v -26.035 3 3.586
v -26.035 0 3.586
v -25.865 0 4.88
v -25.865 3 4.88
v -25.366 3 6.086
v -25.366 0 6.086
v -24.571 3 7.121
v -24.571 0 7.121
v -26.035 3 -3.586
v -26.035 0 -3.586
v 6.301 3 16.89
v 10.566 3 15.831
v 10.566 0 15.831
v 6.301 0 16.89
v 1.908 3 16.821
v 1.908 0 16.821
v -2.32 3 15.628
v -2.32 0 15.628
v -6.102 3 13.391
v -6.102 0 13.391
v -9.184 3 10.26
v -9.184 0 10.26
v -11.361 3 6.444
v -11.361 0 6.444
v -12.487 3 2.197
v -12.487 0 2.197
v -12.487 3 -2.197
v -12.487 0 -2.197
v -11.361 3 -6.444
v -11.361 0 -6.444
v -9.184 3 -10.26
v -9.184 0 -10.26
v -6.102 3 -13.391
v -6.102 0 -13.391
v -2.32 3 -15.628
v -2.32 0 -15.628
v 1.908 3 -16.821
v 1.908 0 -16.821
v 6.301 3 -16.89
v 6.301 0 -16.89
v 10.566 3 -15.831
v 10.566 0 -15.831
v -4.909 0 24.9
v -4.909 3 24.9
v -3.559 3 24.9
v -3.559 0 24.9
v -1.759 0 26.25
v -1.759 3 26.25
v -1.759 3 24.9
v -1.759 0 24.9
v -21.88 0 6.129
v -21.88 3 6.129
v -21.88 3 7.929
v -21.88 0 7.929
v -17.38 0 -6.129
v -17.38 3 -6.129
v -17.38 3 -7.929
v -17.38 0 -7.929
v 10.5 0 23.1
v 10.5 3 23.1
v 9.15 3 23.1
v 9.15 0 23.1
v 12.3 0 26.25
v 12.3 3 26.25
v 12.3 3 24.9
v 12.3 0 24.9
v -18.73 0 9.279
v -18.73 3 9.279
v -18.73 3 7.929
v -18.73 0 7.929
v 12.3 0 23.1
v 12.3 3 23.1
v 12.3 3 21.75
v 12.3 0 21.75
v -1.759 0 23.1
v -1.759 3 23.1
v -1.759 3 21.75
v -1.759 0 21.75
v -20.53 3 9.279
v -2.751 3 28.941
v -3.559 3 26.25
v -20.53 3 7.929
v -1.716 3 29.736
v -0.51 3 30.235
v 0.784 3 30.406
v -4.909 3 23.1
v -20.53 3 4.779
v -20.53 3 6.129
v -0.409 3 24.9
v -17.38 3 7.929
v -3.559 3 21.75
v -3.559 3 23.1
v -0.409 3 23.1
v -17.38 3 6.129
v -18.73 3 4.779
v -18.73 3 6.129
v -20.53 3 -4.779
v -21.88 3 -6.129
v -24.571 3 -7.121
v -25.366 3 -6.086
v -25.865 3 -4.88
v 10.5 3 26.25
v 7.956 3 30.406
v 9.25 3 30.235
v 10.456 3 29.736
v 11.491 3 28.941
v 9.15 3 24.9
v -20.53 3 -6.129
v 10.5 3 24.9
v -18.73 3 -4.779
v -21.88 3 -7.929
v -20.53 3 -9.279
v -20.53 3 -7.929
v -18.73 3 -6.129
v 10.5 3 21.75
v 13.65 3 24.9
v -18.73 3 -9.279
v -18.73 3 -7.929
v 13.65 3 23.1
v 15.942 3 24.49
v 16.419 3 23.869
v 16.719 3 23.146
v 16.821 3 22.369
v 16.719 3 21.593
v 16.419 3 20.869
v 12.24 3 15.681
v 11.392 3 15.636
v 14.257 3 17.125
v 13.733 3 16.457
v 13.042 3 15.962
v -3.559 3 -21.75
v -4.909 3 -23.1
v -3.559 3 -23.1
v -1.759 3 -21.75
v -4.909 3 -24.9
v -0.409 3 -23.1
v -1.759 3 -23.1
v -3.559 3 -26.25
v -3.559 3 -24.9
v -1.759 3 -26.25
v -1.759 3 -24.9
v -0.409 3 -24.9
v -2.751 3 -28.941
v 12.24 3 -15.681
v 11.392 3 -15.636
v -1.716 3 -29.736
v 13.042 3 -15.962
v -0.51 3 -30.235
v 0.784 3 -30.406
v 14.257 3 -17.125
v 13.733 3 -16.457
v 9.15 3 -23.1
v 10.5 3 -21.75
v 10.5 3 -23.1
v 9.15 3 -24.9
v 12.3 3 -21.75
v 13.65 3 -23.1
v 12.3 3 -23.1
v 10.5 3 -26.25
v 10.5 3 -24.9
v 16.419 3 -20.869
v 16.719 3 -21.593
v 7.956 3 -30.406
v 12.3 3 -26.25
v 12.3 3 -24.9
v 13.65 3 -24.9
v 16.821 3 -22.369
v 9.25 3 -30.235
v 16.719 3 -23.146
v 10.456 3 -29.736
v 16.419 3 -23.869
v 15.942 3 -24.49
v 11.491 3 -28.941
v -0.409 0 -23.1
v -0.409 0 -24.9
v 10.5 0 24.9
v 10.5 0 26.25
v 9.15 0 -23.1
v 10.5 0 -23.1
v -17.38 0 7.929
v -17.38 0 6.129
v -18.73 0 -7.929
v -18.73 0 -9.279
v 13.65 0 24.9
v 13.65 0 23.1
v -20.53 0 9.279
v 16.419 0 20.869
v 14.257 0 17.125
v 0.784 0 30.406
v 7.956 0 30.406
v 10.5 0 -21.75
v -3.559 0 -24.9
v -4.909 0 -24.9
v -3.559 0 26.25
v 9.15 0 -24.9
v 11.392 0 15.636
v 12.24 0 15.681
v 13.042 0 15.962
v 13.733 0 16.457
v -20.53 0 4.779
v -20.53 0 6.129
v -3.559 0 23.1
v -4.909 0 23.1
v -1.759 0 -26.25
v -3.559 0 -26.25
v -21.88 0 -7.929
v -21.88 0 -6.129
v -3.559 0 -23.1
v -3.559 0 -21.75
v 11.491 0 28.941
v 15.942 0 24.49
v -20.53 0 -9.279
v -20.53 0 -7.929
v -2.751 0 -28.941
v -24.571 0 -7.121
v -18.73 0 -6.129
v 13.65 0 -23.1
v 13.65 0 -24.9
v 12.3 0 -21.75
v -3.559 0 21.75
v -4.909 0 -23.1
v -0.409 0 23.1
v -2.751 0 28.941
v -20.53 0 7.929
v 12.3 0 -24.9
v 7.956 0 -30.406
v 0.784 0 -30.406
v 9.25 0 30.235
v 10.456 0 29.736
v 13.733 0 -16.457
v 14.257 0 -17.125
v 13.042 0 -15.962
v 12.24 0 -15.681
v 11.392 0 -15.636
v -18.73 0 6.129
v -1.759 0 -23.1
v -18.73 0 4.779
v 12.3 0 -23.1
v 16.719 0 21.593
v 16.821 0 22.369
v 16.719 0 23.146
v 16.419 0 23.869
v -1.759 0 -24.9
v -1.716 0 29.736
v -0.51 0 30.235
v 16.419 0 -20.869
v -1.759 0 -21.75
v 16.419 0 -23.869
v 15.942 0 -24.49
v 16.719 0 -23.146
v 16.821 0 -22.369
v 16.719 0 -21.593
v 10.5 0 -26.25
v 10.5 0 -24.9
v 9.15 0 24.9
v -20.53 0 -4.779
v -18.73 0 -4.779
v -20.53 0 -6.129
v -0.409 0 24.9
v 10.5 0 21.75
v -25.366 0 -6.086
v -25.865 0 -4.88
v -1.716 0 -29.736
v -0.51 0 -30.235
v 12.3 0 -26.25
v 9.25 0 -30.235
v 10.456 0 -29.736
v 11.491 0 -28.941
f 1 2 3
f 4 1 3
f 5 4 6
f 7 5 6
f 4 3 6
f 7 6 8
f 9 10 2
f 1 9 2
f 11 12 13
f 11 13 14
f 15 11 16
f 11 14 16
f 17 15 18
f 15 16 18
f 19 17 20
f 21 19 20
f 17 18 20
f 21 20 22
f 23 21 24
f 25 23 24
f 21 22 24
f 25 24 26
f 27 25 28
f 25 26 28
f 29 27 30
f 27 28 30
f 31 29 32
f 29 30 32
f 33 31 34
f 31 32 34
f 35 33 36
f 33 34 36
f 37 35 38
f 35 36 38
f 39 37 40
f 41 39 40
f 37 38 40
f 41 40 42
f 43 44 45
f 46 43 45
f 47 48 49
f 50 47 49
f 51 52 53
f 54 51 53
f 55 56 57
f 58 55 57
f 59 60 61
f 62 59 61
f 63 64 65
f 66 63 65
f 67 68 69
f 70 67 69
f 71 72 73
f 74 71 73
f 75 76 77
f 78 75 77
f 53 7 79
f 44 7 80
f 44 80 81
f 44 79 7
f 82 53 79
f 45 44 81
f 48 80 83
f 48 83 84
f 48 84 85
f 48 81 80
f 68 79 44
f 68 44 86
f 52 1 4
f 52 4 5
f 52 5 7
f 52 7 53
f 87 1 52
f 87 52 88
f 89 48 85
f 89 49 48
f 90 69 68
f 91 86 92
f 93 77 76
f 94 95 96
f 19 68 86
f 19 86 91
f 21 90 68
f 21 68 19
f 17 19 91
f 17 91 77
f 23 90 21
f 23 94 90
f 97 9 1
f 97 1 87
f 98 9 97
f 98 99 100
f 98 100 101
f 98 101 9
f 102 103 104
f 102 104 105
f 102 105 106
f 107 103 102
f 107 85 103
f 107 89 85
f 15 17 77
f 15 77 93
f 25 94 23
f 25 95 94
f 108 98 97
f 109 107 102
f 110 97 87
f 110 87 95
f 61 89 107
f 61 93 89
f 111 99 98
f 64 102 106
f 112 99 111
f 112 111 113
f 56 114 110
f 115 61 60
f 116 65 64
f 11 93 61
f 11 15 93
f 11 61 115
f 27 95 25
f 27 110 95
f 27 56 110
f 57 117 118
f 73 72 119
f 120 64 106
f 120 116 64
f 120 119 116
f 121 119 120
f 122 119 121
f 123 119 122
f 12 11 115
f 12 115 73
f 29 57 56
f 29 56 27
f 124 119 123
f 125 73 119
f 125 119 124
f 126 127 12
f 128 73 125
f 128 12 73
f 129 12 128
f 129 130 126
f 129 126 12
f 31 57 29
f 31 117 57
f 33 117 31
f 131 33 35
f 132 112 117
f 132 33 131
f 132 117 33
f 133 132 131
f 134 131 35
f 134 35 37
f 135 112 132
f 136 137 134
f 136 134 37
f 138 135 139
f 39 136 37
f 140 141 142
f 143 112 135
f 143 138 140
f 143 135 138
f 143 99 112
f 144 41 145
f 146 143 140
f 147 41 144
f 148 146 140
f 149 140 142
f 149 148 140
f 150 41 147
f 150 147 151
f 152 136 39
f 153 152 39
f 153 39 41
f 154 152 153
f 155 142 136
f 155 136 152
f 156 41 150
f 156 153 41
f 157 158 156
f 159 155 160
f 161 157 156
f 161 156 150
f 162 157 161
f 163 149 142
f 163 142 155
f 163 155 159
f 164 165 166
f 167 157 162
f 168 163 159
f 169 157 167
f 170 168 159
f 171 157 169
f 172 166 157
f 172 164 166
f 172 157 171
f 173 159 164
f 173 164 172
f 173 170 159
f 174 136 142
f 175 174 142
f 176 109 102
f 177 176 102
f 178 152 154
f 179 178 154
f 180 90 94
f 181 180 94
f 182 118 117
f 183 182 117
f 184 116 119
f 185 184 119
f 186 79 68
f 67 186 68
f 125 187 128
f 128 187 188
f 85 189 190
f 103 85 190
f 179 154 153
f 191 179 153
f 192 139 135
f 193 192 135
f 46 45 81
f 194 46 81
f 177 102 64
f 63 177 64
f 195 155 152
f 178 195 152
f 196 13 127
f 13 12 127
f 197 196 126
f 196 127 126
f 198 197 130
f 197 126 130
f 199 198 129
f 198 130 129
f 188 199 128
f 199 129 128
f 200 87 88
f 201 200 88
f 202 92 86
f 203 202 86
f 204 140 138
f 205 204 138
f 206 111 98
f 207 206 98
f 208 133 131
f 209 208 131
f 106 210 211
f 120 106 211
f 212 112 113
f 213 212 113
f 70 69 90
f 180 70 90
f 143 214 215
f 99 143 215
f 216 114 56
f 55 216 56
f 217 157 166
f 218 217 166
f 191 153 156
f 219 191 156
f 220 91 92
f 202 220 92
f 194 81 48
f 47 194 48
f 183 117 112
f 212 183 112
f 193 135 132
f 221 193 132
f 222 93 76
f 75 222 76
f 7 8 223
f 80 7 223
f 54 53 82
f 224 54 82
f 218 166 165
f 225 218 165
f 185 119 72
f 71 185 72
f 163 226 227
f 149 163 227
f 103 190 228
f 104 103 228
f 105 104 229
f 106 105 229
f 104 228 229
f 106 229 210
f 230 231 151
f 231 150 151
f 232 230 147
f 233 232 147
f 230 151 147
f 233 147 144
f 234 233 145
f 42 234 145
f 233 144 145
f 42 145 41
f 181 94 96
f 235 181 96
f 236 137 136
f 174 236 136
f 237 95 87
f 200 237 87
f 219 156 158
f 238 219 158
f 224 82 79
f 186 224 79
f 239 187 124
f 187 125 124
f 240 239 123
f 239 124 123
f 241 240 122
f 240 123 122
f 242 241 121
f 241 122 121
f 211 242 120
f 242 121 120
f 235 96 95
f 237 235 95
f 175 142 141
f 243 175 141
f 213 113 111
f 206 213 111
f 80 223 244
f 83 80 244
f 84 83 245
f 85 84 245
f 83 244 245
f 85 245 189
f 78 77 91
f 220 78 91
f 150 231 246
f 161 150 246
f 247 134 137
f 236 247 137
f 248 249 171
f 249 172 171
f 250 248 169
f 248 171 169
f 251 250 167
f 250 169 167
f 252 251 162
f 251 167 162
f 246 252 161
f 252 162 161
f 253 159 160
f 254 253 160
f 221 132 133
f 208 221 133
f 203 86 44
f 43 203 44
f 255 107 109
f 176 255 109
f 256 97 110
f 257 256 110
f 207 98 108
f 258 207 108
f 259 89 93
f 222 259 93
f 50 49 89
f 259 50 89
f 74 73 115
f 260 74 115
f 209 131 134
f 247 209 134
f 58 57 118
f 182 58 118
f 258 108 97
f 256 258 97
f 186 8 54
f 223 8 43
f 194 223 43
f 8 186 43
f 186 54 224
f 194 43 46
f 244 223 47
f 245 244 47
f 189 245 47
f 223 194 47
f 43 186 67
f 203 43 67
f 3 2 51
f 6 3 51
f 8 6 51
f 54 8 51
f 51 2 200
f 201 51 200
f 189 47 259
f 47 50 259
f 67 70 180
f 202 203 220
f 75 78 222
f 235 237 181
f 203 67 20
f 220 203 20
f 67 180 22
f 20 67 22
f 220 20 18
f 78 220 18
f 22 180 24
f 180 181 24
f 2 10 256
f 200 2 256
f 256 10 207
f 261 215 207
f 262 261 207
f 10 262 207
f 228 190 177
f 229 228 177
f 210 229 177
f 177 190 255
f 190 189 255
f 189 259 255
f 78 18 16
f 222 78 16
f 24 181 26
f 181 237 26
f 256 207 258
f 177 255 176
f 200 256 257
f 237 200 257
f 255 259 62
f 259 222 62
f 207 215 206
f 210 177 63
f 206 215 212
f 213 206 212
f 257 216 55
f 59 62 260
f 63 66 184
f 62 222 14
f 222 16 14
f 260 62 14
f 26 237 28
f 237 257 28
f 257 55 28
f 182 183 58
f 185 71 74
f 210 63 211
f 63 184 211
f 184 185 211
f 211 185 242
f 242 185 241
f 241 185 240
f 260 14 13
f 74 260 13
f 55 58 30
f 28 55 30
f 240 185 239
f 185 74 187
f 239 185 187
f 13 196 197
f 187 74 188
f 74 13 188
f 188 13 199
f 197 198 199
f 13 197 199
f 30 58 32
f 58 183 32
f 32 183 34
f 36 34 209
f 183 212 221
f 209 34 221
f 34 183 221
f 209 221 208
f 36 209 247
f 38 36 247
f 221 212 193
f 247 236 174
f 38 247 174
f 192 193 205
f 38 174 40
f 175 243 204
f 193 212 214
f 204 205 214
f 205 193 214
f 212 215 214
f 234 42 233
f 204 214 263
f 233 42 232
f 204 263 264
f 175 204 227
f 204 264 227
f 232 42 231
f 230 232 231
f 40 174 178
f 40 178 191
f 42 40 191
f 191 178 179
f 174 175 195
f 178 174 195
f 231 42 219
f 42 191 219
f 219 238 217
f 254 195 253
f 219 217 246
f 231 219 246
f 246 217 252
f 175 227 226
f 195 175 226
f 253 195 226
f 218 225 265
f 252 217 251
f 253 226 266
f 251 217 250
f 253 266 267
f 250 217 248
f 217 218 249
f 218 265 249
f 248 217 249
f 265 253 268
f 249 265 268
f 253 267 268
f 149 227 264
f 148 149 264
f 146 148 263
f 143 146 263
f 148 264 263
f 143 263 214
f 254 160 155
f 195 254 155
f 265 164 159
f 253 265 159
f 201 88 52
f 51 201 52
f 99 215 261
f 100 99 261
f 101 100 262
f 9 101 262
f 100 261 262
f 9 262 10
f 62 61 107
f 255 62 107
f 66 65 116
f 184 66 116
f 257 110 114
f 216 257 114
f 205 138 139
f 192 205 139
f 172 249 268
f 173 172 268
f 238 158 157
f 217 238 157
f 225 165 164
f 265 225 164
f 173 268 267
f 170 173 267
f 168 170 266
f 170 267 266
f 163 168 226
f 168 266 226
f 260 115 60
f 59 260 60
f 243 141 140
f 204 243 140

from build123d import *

# Parameters (mm, degrees)
BOSS_EXTRUDE1_DEPTH = 3
CUT_EXTRUDE1_DEPTH  = 4
FILLET1_R           = 3


with BuildPart() as part:
    # Sketch1 → Boss-Extrude1 (new body)
    with BuildSketch(Plane(origin=(0, 0, 0), x_dir=(1, 0, 0), z_dir=(0, 1, 0))):
        with BuildLine():
            Line((17.56993863, 22.86267454), (11.491487674, 28.941125497))
            ThreePointArc((11.491487674, 28.941125497), (9.869370929, 30.024989254), (7.955953768, 30.405591591))
            Line((7.955953768, 30.405591591), (0.784380892, 30.405591591))
            ThreePointArc((0.784380892, 30.405591591), (-1.129036269, 30.024989254), (-2.751153014, 28.941125497))
            Line((-2.751153014, 28.941125497), (-24.570958167, 7.121320344))
            ThreePointArc((-24.570958167, 7.121320344), (-25.654821924, 5.499203599), (-26.035424261, 3.585786438))
            Line((-26.035424261, 3.585786438), (-26.035424261, -3.585786438))
            ThreePointArc((-26.035424261, -3.585786438), (-25.654821924, -5.499203599), (-24.570958167, -7.121320344))
            Line((-24.570958167, -7.121320344), (-2.751153014, -28.941125497))
            ThreePointArc((-2.751153014, -28.941125497), (-1.129036269, -30.024989254), (0.784380892, -30.405591591))
            Line((0.784380892, -30.405591591), (7.955953768, -30.405591591))
            ThreePointArc((7.955953768, -30.405591591), (9.869370929, -30.024989254), (11.491487674, -28.941125497))
            Line((11.491487674, -28.941125497), (17.56993863, -22.86267454))
            Line((17.56993863, -22.86267454), (12.87016733, -14.722431864))
            ThreePointArc((12.87016733, -14.722431864), (-12.62983267, 0), (12.87016733, 14.722431864))
            Line((12.87016733, 14.722431864), (17.56993863, 22.86267454))
        make_face()
    extrude(amount=BOSS_EXTRUDE1_DEPTH)

    # Sketch2 → Cut-Extrude1 (cut, through all)
    with BuildSketch(Plane(origin=(0, 3, 0), x_dir=(1, 0, 0), z_dir=(0, 1, 0))):
        Polygon((-21.87983267, 7.929437252), (-21.87983267, 6.129437252), (-20.52983267, 6.129437252), (-20.52983267, 4.779437252), (-18.72983267, 4.779437252), (-18.72983267, 6.129437252), (-17.37983267, 6.129437252), (-17.37983267, 7.929437252), (-18.72983267, 7.929437252), (-18.72983267, 9.279437252), (-20.52983267, 9.279437252), (-20.52983267, 7.929437252), align=None)
        Polygon((-18.72983267, -4.779437252), (-20.52983267, -4.779437252), (-20.52983267, -6.129437252), (-21.87983267, -6.129437252), (-21.87983267, -7.929437252), (-20.52983267, -7.929437252), (-20.52983267, -9.279437252), (-18.72983267, -9.279437252), (-18.72983267, -7.929437252), (-17.37983267, -7.929437252), (-17.37983267, -6.129437252), (-18.72983267, -6.129437252), align=None)
        Polygon((12.299604582, 23.1), (13.649604582, 23.1), (13.649604582, 24.9), (12.299604582, 24.9), (12.299604582, 26.25), (10.499604582, 26.25), (10.499604582, 24.9), (9.149604582, 24.9), (9.149604582, 23.1), (10.499604582, 23.1), (10.499604582, 21.75), (12.299604582, 21.75), align=None)
        Polygon((30.62016733, -7.929437252), (30.62016733, -6.129437252), (29.27016733, -6.129437252), (29.27016733, -4.779437252), (27.47016733, -4.779437252), (27.47016733, -6.129437252), (26.12016733, -6.129437252), (26.12016733, -7.929437252), (27.47016733, -7.929437252), (27.47016733, -9.279437252), (29.27016733, -9.279437252), (29.27016733, -7.929437252), align=None)
        Polygon((-0.409269922, 24.9), (-1.759269922, 24.9), (-1.759269922, 26.25), (-3.559269922, 26.25), (-3.559269922, 24.9), (-4.909269922, 24.9), (-4.909269922, 23.1), (-3.559269922, 23.1), (-3.559269922, 21.75), (-1.759269922, 21.75), (-1.759269922, 23.1), (-0.409269922, 23.1), align=None)
        Polygon((30.62016733, 7.929437252), (29.27016733, 7.929437252), (29.27016733, 9.279437252), (27.47016733, 9.279437252), (27.47016733, 7.929437252), (26.12016733, 7.929437252), (26.12016733, 6.129437252), (27.47016733, 6.129437252), (27.47016733, 4.779437252), (29.27016733, 4.779437252), (29.27016733, 6.129437252), (30.62016733, 6.129437252), align=None)
        Polygon((-1.759269922, -26.25), (-1.759269922, -24.9), (-0.409269922, -24.9), (-0.409269922, -23.1), (-1.759269922, -23.1), (-1.759269922, -21.75), (-3.559269922, -21.75), (-3.559269922, -23.1), (-4.909269922, -23.1), (-4.909269922, -24.9), (-3.559269922, -24.9), (-3.559269922, -26.25), align=None)
        Polygon((12.299604582, -26.25), (12.299604582, -24.9), (13.649604582, -24.9), (13.649604582, -23.1), (12.299604582, -23.1), (12.299604582, -21.75), (10.499604582, -21.75), (10.499604582, -23.1), (9.149604582, -23.1), (9.149604582, -24.9), (10.499604582, -24.9), (10.499604582, -26.25), align=None)
    extrude(amount=-CUT_EXTRUDE1_DEPTH, mode=Mode.SUBTRACT)

    # Fillet1
    fillet1_edges = [part.edges().sort_by_distance(p)[0] for p in [
        (12.87016733, 1.5, 14.722431864),
        (17.56993863, 1.5, 22.86267454),
        (17.56993863, 1.5, -22.86267454),
        (12.87016733, 1.5, -14.722431864),
    ]]
    fillet(fillet1_edges, radius=FILLET1_R)


solid = part.part
